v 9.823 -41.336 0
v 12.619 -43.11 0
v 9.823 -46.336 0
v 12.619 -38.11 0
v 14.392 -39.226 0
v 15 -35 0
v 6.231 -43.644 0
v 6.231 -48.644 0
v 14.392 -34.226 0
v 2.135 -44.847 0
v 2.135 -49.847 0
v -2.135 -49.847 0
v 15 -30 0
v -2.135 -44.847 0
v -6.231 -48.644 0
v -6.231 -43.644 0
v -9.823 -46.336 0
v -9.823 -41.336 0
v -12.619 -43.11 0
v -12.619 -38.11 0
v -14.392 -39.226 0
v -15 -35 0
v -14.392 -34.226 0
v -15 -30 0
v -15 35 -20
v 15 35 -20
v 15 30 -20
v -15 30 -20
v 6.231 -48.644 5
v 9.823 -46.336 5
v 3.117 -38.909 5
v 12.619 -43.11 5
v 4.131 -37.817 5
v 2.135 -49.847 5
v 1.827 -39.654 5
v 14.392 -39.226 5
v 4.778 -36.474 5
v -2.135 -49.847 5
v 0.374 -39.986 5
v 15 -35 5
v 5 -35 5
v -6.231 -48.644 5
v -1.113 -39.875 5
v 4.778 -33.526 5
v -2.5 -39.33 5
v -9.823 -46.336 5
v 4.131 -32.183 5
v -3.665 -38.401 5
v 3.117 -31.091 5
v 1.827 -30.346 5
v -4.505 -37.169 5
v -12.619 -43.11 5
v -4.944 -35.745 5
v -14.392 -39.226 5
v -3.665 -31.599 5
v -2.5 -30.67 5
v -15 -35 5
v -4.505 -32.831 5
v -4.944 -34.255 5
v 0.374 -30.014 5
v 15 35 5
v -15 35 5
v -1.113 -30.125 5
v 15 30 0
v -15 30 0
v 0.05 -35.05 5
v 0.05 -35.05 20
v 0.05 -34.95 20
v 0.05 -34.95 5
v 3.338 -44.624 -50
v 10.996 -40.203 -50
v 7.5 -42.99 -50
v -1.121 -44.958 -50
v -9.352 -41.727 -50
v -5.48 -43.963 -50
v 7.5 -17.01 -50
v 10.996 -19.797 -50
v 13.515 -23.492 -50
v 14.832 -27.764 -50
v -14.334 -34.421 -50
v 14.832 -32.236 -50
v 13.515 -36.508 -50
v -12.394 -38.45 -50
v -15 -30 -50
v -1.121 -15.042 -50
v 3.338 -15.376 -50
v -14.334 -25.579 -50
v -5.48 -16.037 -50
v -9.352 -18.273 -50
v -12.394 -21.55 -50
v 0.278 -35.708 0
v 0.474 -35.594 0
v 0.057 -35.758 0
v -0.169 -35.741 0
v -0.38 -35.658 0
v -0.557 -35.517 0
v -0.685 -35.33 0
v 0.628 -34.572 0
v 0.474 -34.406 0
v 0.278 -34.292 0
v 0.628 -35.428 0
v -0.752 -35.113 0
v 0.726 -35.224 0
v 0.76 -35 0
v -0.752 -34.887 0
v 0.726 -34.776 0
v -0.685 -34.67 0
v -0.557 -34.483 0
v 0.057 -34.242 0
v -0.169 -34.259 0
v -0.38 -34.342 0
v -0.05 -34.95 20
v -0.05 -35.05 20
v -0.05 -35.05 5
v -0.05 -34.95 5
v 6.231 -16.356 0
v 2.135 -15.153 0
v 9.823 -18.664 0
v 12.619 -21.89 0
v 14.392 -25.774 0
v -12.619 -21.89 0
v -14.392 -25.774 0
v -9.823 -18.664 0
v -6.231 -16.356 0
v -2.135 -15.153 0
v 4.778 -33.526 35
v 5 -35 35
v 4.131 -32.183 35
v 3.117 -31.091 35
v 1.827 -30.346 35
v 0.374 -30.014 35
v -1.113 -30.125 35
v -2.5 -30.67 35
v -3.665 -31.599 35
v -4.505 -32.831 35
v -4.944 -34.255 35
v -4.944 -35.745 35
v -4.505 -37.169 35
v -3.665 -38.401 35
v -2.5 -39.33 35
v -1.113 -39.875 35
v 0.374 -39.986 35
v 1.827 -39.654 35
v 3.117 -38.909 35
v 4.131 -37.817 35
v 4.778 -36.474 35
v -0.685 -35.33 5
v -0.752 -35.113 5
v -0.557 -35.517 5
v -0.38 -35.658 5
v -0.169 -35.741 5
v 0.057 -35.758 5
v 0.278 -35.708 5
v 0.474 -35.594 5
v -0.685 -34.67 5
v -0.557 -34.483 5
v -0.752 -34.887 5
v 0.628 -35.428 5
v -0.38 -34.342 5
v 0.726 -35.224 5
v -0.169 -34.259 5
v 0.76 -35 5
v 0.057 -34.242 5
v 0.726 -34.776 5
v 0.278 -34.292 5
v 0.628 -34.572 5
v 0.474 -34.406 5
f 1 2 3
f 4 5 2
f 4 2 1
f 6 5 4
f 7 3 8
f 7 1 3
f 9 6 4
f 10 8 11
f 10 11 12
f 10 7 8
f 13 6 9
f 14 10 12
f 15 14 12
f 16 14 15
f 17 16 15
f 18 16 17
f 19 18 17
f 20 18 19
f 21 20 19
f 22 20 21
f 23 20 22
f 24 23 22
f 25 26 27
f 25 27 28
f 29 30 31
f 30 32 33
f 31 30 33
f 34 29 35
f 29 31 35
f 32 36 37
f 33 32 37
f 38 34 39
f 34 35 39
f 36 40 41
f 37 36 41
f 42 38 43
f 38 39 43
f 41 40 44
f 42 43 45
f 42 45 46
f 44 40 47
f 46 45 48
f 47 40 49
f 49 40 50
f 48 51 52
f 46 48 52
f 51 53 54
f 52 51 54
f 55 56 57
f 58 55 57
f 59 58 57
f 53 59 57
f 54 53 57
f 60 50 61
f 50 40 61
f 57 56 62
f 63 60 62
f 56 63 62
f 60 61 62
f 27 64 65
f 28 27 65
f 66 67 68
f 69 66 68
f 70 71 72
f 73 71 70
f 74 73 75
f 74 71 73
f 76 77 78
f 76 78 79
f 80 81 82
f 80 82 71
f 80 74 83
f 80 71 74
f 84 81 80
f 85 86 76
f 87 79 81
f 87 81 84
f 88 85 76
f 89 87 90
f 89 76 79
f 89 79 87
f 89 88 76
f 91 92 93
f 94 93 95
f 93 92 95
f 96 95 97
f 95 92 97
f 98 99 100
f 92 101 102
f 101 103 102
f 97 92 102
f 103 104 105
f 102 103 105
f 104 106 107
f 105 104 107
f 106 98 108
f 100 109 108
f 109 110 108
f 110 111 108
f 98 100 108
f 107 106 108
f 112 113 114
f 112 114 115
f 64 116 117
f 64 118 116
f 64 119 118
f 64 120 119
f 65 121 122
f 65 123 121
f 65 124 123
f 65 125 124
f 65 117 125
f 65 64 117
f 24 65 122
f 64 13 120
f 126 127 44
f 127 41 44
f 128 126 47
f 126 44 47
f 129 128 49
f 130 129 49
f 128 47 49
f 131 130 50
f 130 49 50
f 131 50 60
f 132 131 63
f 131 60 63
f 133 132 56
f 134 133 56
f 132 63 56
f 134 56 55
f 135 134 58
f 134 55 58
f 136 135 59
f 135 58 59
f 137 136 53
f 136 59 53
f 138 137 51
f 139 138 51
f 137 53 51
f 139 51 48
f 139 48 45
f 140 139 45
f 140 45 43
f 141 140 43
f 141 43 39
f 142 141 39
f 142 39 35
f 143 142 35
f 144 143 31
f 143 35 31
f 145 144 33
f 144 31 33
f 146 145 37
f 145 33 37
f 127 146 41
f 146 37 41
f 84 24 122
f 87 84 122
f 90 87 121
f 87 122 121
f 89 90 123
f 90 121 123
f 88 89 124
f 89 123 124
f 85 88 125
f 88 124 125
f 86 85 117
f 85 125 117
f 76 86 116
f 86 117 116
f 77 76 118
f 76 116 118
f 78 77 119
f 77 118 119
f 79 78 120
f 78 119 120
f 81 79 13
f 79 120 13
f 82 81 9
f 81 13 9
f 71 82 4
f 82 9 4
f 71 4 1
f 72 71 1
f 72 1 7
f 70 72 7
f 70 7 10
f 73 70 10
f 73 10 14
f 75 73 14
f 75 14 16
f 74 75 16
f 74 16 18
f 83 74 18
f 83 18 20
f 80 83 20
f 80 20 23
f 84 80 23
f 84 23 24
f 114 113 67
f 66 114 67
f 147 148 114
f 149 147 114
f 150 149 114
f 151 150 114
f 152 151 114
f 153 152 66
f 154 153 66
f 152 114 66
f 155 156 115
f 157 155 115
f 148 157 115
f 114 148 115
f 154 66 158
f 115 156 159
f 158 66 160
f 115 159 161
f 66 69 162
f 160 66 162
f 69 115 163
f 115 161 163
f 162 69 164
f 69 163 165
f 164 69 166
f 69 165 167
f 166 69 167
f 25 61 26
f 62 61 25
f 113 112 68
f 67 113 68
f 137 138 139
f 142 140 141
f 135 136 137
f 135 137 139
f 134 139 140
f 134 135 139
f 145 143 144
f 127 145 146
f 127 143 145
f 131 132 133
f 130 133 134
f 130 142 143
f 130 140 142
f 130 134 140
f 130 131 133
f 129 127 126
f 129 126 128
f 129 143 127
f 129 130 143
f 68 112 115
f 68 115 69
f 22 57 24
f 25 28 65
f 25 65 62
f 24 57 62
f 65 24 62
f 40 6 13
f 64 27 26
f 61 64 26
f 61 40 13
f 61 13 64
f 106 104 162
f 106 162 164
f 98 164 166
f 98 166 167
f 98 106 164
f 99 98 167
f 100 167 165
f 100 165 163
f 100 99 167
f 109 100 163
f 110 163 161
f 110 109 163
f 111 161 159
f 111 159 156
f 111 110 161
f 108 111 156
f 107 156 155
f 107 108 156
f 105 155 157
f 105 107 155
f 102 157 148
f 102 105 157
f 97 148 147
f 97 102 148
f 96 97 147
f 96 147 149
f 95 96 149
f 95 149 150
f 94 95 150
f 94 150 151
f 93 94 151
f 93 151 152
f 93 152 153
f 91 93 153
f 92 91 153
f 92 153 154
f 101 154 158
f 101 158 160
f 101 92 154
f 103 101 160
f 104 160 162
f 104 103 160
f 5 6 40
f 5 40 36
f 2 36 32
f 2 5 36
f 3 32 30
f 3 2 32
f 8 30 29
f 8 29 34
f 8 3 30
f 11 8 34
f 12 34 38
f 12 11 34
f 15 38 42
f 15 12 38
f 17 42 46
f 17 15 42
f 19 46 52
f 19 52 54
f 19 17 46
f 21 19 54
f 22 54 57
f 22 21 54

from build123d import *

# Parameters (mm, degrees)
ESQUISSE1_R             = 0.76020263
BOSS_EXTRU_1_DEPTH      = 5
ESQUISSE2_W             = 30
ESQUISSE2_H             = 5
BOSS_EXTRU_2_DEPTH      = 20
ESQUISSE4_R             = 5
BOSS_EXTRU_3_DEPTH      = 15
ESQUISSE5_R             = 15
BOSS_EXTRU_4_DEPTH      = 50
ESQUISSE8_W             = 0.1
ESQUISSE8_H             = 0.1
ENL_V_MAT_EXTRU_1_DEPTH = 15
ESQUISSE7_R             = 5
BOSS_EXTRU_6_DEPTH      = 15


with BuildPart() as part:
    # Esquisse1 → Boss.-Extru.1 (new body)
    with BuildSketch(Plane.XY):
        with BuildLine():
            Line((-15, 35), (15, 35))
            Line((15, 35), (15, -34.999999772))
            ThreePointArc((15, -34.999999772), (1.14e-07, -49.999999886), (-15, -35))
            Line((-15, -35), (-15, 35))
        make_face()
        with Locations((0, -34.999999886)):
            Circle(ESQUISSE1_R, mode=Mode.SUBTRACT)
    extrude(amount=BOSS_EXTRU_1_DEPTH)

    # Esquisse2 → Boss.-Extru.2 (add)
    with BuildSketch(Plane(origin=(0, 0, 0), x_dir=(-1, 0, 0), z_dir=(0, 0, -1))):
        with Locations((0, 32.5)):
            Rectangle(ESQUISSE2_W, ESQUISSE2_H)
    extrude(amount=BOSS_EXTRU_2_DEPTH)

    # Esquisse4 → Boss.-Extru.3 (add)
    with BuildSketch(Plane.XY.offset(5)):
        with Locations((0, -34.999999886)):
            Circle(ESQUISSE4_R)
    extrude(amount=BOSS_EXTRU_3_DEPTH)

    # Esquisse5 → Boss.-Extru.4 (add)
    with BuildSketch(Plane(origin=(0, 0, 0), x_dir=(-1, 0, 0), z_dir=(0, 0, -1))):
        with Locations((0, -30)):
            Circle(ESQUISSE5_R)
    extrude(amount=BOSS_EXTRU_4_DEPTH)

    # Esquisse8 → Enlèv. mat.-Extru.1 (cut)
    with BuildSketch(Plane.XY.offset(20)):
        with Locations((0, -34.999999886)):
            Rectangle(ESQUISSE8_W, ESQUISSE8_H)
    extrude(amount=-ENL_V_MAT_EXTRU_1_DEPTH, mode=Mode.SUBTRACT)

    # Esquisse7 → Boss.-Extru.6 (add)
    with BuildSketch(Plane.XY.offset(20)):
        with Locations((0, -34.999999886)):
            Circle(ESQUISSE7_R)
    extrude(amount=BOSS_EXTRU_6_DEPTH)


solid = part.part
